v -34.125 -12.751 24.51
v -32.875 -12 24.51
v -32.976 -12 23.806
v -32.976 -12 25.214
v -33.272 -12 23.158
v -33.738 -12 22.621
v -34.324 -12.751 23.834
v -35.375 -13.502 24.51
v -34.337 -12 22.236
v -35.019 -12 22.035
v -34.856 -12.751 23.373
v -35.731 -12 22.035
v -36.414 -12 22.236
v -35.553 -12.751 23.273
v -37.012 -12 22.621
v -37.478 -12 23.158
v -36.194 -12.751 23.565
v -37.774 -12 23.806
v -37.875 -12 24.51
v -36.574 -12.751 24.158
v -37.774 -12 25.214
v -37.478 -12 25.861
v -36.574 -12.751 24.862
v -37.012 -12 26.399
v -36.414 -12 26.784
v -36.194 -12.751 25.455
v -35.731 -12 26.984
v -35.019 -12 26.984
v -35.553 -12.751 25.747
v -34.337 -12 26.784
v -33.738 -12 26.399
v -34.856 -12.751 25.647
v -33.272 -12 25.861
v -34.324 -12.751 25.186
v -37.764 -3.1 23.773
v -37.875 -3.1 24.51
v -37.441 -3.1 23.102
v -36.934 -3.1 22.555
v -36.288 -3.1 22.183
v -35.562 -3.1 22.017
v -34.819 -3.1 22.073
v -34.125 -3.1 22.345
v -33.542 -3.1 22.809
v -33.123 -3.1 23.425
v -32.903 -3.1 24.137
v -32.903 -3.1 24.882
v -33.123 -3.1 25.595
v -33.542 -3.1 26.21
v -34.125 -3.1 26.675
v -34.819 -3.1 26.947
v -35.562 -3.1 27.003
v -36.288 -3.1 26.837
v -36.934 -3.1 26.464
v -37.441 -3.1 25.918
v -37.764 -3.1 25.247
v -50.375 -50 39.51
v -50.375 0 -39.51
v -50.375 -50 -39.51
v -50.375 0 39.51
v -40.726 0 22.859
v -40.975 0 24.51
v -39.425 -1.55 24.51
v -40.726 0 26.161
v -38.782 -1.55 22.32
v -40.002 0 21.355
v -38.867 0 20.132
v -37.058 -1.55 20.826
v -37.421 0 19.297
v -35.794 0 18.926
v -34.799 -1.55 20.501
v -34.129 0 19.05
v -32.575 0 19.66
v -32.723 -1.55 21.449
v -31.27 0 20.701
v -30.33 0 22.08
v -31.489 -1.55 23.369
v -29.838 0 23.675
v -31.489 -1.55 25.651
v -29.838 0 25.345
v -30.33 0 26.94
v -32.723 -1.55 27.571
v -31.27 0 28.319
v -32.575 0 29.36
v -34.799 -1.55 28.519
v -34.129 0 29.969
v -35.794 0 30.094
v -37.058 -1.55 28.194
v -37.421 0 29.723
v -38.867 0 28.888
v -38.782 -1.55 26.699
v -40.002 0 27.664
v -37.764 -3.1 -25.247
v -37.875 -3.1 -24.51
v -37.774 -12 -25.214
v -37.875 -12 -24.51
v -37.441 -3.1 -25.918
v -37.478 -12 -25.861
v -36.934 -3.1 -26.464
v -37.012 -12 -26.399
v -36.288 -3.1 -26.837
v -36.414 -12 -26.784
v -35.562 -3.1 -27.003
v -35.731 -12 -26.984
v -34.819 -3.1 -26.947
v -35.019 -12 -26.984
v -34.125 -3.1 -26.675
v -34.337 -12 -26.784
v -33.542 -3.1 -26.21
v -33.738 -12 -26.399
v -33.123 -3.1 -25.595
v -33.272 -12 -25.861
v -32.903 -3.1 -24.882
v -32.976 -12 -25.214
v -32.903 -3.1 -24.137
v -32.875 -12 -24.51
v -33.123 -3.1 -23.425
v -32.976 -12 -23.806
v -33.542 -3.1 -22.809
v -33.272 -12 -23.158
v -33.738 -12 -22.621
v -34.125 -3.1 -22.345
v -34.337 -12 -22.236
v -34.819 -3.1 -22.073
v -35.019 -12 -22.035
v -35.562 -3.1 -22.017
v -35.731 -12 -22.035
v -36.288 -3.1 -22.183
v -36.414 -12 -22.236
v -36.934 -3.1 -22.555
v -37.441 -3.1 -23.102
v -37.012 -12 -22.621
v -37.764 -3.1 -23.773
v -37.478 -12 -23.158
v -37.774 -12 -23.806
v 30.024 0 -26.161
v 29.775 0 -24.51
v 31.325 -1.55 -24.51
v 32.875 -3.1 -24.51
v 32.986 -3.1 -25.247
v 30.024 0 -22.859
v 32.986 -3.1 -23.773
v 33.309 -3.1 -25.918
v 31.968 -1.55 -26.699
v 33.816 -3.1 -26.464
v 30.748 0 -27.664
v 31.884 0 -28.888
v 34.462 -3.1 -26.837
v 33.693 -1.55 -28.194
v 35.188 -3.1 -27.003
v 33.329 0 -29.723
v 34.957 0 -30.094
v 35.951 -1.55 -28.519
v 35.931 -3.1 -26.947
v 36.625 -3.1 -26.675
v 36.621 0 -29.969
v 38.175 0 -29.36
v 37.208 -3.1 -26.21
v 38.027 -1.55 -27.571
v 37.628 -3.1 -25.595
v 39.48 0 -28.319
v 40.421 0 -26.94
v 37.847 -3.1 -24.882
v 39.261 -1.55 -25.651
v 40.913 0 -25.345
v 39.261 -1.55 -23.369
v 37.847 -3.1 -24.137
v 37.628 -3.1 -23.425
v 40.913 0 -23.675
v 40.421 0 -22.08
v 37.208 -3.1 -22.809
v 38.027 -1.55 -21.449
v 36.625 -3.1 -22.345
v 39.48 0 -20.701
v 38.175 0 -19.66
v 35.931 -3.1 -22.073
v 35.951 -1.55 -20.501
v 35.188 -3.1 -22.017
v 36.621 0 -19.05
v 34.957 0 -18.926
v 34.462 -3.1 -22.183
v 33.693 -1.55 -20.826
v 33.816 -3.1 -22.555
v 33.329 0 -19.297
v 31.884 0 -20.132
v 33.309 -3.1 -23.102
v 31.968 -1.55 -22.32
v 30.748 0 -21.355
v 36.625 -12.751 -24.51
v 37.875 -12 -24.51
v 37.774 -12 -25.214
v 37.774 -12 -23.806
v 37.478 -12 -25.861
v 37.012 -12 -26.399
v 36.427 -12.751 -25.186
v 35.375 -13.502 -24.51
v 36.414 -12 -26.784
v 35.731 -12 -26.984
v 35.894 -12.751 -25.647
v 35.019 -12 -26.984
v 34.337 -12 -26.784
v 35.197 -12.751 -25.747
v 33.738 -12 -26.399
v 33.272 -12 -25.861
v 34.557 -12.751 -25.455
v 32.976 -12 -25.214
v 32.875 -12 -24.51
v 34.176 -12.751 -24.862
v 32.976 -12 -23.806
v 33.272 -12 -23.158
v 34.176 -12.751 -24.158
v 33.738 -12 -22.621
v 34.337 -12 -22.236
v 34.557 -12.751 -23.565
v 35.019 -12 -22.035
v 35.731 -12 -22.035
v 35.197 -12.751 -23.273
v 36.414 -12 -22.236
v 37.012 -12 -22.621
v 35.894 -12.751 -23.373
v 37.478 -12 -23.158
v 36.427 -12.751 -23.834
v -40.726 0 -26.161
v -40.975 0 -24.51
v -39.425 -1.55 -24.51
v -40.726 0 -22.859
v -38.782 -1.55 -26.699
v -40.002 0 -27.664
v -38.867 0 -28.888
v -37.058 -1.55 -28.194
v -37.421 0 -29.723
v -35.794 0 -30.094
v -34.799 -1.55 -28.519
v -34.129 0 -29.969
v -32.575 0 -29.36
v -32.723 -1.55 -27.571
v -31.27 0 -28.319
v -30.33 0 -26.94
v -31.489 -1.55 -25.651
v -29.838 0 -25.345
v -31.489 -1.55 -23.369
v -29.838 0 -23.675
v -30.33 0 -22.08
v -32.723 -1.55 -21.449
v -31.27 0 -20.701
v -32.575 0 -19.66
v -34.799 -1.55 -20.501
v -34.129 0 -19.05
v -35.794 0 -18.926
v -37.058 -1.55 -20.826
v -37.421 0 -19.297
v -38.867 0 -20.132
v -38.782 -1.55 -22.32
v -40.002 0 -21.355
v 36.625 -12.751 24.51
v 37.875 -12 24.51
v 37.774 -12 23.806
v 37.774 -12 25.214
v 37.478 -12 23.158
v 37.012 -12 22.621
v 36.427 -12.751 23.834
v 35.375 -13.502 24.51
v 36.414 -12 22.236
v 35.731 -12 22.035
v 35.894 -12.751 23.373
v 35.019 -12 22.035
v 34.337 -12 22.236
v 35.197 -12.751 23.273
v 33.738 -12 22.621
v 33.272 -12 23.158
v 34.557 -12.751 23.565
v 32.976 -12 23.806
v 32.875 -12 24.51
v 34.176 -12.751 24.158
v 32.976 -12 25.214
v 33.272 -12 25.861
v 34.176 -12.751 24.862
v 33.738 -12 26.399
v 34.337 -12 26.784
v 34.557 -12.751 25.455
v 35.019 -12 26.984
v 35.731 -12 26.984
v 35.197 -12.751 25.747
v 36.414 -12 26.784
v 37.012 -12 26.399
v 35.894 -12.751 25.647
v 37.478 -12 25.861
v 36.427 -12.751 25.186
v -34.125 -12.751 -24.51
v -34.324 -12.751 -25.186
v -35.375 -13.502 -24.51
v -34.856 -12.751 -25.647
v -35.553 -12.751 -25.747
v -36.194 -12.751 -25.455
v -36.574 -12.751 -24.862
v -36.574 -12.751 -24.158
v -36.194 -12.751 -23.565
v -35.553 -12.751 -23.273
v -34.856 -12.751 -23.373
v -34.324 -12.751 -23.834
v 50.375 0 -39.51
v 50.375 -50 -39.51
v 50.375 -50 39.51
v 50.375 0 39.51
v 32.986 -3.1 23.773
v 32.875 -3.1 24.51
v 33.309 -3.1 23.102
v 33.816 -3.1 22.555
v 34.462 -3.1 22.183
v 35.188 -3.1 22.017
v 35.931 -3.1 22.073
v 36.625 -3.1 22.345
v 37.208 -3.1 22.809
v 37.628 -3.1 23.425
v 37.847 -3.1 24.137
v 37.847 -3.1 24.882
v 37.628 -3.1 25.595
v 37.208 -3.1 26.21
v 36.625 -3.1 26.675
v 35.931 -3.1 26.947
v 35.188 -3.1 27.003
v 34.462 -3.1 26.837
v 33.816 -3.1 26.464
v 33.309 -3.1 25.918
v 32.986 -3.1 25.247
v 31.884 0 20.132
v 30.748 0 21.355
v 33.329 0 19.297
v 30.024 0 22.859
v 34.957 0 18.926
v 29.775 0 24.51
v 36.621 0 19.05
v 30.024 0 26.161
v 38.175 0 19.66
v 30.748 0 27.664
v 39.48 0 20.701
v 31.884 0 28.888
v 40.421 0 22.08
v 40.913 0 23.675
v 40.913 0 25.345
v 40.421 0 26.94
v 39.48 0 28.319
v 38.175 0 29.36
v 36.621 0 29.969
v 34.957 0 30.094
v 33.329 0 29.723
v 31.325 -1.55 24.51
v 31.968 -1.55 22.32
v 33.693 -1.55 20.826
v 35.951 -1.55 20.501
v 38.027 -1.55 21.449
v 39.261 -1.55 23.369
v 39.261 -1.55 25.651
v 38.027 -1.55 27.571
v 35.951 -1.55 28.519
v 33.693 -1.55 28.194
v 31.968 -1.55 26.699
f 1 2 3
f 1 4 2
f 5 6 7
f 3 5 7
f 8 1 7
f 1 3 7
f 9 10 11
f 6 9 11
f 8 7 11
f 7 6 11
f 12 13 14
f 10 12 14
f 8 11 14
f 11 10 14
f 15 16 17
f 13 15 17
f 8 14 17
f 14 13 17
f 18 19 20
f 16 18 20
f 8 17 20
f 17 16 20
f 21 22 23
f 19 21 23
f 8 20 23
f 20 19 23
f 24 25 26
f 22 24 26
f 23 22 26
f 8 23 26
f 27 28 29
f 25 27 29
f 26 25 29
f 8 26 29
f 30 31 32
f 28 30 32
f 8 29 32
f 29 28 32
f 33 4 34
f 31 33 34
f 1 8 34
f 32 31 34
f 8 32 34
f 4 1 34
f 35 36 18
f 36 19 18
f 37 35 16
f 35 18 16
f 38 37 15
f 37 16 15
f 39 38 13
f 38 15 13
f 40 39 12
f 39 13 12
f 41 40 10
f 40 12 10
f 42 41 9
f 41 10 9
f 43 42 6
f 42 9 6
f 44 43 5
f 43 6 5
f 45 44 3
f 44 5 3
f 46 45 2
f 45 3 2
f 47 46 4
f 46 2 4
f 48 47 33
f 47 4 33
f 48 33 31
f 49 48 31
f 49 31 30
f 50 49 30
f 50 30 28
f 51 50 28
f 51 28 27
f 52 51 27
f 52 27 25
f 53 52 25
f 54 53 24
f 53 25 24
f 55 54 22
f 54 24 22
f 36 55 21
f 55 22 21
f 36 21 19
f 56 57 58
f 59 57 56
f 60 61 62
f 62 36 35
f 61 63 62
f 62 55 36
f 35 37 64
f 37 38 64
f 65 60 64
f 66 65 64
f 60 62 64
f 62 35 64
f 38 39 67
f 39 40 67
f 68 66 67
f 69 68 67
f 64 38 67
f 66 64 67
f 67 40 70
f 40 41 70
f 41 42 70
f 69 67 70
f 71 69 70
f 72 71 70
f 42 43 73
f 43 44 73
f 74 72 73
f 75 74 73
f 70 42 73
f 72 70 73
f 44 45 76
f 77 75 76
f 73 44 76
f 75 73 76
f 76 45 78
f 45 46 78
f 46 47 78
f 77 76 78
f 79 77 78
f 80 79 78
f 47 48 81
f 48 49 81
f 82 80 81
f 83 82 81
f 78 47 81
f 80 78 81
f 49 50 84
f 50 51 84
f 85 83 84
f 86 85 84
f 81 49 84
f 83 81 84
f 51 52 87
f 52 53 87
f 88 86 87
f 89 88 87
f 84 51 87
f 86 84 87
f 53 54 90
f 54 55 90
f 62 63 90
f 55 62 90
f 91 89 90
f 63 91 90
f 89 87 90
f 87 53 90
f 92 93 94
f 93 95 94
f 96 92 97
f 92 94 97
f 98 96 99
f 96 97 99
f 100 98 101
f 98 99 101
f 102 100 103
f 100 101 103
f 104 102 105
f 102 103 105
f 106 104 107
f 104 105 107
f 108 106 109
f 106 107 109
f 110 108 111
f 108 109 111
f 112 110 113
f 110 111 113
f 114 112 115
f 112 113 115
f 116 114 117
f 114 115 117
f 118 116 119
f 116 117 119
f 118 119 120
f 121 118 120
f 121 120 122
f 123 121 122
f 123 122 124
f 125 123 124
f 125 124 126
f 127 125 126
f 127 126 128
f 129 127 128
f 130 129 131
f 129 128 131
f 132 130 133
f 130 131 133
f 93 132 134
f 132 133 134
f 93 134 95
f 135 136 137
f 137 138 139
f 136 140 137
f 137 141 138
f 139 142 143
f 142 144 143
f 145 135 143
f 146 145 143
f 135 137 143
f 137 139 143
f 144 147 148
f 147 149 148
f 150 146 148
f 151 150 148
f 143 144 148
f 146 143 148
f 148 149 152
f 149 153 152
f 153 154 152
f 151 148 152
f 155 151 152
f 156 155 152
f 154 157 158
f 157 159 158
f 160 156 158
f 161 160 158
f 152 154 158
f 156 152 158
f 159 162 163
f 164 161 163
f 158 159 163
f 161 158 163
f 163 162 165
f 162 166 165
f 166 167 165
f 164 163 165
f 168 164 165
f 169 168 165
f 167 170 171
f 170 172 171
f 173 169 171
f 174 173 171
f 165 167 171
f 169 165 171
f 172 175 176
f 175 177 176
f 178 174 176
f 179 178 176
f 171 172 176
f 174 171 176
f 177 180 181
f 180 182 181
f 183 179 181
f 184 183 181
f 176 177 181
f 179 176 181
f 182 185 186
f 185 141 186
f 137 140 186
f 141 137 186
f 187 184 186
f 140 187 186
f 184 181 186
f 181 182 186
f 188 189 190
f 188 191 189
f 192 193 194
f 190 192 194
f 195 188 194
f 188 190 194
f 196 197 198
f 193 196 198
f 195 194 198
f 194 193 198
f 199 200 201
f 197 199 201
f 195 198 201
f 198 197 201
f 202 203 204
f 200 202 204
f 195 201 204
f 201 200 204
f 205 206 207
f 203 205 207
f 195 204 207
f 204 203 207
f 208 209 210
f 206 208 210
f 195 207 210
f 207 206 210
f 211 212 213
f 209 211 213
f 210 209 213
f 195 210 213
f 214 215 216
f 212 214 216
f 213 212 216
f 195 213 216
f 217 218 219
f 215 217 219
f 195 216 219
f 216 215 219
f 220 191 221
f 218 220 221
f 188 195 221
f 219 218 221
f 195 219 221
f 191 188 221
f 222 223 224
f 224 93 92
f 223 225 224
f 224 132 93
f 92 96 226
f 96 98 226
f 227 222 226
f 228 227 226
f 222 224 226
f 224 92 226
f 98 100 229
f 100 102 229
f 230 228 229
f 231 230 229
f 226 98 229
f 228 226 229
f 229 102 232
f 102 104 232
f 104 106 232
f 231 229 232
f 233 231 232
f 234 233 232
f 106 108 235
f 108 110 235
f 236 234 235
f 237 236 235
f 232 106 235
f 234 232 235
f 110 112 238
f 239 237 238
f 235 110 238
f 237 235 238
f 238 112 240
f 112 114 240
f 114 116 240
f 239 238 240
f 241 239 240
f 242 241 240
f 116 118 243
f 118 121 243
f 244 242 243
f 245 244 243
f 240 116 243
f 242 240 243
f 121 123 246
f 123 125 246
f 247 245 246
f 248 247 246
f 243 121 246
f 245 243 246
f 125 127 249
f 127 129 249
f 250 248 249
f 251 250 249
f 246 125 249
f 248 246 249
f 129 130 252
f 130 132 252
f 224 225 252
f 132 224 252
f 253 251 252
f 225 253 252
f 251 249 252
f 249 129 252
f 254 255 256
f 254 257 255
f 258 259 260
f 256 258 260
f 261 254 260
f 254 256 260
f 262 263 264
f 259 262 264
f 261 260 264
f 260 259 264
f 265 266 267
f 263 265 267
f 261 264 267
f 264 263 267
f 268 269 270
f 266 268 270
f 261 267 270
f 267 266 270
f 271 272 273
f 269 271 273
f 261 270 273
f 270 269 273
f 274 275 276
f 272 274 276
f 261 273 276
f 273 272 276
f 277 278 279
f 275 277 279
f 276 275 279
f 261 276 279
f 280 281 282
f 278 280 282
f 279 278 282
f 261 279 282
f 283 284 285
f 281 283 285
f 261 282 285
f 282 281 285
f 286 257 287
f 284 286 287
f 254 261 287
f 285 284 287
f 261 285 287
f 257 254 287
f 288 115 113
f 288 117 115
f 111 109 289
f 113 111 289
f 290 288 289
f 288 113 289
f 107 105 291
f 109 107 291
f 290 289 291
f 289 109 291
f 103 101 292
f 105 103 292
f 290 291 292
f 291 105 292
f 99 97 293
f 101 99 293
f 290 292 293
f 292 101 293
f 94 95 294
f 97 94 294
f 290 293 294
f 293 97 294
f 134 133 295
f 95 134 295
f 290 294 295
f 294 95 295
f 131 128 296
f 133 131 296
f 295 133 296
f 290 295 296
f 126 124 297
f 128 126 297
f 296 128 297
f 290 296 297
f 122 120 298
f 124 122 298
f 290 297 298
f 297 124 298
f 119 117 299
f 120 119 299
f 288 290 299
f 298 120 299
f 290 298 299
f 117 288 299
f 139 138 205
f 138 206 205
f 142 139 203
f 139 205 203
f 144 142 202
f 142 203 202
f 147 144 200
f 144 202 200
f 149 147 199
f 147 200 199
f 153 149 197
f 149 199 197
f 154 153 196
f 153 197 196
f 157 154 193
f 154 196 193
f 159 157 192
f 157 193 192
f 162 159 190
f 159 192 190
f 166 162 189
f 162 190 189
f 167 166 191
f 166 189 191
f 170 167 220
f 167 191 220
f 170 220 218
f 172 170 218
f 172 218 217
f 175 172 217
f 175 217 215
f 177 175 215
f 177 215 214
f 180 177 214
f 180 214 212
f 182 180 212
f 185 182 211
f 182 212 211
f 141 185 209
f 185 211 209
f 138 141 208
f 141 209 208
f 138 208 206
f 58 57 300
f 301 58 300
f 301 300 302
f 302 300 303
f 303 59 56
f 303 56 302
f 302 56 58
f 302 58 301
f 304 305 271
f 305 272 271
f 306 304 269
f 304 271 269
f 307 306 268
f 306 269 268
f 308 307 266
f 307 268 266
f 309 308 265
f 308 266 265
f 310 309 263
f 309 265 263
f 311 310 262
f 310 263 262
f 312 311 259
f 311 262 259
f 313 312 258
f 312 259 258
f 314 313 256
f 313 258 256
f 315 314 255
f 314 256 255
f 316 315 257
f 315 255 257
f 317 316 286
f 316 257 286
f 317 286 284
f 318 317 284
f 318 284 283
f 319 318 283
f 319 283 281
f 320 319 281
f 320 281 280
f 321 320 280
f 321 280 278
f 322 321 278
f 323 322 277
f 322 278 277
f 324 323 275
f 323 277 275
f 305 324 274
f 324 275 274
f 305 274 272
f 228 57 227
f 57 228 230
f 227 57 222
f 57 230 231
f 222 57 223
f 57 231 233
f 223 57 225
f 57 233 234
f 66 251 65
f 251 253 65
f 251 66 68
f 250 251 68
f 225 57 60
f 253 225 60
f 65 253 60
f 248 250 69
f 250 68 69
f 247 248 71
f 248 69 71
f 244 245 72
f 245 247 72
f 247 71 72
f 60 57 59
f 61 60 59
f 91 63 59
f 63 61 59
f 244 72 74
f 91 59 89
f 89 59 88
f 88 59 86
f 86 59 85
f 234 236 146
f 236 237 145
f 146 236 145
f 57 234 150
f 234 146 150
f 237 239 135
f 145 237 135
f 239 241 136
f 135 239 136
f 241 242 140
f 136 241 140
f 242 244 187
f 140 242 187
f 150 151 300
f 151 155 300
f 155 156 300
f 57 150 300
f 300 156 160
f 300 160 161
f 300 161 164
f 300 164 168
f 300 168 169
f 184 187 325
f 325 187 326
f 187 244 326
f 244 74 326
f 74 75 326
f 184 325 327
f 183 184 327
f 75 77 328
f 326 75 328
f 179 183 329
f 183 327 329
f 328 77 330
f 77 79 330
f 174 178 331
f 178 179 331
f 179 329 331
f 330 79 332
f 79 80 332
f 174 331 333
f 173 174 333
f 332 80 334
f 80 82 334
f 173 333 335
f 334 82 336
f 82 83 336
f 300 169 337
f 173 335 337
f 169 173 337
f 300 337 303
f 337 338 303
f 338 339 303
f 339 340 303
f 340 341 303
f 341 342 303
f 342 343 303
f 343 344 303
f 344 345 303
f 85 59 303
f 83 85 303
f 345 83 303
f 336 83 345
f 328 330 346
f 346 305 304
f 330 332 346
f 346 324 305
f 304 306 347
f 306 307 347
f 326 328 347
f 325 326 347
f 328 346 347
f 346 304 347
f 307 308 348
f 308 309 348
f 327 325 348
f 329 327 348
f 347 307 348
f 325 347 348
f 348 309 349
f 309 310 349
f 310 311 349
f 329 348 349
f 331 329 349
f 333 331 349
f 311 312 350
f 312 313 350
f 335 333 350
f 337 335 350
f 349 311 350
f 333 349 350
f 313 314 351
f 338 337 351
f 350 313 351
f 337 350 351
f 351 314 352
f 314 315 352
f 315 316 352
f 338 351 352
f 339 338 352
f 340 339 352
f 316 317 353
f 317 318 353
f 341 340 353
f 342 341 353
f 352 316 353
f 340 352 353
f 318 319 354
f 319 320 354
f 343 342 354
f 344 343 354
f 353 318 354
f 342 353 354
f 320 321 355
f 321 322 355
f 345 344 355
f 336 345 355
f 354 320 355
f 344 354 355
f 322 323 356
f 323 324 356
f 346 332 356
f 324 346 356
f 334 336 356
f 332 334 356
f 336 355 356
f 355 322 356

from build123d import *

# Parameters (mm, degrees)
F0_W           = 100.7501929998
F0_H           = 79.0197588503
F1_DEPTH       = 50
F2_D           = 5
F2_DEPTH       = 12
F2_CSINK_D     = 11.2
F2_CSINK_ANGLE = 90
F2_TIP         = 1.5021515476


with BuildPart() as f1:
    # F0 (on Front) → F1 (new body)
    with BuildSketch(Plane.XZ):
        Rectangle(F0_W, F0_H)
    extrude(amount=F1_DEPTH)

    # F2
    with Locations(Plane(origin=(0, 0, 0), x_dir=(1, 0, 0), z_dir=(0, 1, 0))):
        with Locations((-35.3750964999, -24.5098794252), (35.3750964999, -24.5098794252), (35.3750964999, 24.5098794252), (-35.3750964999, 24.5098794252)):
            CounterSinkHole(F2_D / 2, F2_CSINK_D / 2, depth=F2_DEPTH, counter_sink_angle=F2_CSINK_ANGLE)
            with Locations((0, 0, -(F2_DEPTH + F2_TIP / 2))):  # 118° drill point
                Cone(0, F2_D / 2, F2_TIP, mode=Mode.SUBTRACT)


solid = f1.part
